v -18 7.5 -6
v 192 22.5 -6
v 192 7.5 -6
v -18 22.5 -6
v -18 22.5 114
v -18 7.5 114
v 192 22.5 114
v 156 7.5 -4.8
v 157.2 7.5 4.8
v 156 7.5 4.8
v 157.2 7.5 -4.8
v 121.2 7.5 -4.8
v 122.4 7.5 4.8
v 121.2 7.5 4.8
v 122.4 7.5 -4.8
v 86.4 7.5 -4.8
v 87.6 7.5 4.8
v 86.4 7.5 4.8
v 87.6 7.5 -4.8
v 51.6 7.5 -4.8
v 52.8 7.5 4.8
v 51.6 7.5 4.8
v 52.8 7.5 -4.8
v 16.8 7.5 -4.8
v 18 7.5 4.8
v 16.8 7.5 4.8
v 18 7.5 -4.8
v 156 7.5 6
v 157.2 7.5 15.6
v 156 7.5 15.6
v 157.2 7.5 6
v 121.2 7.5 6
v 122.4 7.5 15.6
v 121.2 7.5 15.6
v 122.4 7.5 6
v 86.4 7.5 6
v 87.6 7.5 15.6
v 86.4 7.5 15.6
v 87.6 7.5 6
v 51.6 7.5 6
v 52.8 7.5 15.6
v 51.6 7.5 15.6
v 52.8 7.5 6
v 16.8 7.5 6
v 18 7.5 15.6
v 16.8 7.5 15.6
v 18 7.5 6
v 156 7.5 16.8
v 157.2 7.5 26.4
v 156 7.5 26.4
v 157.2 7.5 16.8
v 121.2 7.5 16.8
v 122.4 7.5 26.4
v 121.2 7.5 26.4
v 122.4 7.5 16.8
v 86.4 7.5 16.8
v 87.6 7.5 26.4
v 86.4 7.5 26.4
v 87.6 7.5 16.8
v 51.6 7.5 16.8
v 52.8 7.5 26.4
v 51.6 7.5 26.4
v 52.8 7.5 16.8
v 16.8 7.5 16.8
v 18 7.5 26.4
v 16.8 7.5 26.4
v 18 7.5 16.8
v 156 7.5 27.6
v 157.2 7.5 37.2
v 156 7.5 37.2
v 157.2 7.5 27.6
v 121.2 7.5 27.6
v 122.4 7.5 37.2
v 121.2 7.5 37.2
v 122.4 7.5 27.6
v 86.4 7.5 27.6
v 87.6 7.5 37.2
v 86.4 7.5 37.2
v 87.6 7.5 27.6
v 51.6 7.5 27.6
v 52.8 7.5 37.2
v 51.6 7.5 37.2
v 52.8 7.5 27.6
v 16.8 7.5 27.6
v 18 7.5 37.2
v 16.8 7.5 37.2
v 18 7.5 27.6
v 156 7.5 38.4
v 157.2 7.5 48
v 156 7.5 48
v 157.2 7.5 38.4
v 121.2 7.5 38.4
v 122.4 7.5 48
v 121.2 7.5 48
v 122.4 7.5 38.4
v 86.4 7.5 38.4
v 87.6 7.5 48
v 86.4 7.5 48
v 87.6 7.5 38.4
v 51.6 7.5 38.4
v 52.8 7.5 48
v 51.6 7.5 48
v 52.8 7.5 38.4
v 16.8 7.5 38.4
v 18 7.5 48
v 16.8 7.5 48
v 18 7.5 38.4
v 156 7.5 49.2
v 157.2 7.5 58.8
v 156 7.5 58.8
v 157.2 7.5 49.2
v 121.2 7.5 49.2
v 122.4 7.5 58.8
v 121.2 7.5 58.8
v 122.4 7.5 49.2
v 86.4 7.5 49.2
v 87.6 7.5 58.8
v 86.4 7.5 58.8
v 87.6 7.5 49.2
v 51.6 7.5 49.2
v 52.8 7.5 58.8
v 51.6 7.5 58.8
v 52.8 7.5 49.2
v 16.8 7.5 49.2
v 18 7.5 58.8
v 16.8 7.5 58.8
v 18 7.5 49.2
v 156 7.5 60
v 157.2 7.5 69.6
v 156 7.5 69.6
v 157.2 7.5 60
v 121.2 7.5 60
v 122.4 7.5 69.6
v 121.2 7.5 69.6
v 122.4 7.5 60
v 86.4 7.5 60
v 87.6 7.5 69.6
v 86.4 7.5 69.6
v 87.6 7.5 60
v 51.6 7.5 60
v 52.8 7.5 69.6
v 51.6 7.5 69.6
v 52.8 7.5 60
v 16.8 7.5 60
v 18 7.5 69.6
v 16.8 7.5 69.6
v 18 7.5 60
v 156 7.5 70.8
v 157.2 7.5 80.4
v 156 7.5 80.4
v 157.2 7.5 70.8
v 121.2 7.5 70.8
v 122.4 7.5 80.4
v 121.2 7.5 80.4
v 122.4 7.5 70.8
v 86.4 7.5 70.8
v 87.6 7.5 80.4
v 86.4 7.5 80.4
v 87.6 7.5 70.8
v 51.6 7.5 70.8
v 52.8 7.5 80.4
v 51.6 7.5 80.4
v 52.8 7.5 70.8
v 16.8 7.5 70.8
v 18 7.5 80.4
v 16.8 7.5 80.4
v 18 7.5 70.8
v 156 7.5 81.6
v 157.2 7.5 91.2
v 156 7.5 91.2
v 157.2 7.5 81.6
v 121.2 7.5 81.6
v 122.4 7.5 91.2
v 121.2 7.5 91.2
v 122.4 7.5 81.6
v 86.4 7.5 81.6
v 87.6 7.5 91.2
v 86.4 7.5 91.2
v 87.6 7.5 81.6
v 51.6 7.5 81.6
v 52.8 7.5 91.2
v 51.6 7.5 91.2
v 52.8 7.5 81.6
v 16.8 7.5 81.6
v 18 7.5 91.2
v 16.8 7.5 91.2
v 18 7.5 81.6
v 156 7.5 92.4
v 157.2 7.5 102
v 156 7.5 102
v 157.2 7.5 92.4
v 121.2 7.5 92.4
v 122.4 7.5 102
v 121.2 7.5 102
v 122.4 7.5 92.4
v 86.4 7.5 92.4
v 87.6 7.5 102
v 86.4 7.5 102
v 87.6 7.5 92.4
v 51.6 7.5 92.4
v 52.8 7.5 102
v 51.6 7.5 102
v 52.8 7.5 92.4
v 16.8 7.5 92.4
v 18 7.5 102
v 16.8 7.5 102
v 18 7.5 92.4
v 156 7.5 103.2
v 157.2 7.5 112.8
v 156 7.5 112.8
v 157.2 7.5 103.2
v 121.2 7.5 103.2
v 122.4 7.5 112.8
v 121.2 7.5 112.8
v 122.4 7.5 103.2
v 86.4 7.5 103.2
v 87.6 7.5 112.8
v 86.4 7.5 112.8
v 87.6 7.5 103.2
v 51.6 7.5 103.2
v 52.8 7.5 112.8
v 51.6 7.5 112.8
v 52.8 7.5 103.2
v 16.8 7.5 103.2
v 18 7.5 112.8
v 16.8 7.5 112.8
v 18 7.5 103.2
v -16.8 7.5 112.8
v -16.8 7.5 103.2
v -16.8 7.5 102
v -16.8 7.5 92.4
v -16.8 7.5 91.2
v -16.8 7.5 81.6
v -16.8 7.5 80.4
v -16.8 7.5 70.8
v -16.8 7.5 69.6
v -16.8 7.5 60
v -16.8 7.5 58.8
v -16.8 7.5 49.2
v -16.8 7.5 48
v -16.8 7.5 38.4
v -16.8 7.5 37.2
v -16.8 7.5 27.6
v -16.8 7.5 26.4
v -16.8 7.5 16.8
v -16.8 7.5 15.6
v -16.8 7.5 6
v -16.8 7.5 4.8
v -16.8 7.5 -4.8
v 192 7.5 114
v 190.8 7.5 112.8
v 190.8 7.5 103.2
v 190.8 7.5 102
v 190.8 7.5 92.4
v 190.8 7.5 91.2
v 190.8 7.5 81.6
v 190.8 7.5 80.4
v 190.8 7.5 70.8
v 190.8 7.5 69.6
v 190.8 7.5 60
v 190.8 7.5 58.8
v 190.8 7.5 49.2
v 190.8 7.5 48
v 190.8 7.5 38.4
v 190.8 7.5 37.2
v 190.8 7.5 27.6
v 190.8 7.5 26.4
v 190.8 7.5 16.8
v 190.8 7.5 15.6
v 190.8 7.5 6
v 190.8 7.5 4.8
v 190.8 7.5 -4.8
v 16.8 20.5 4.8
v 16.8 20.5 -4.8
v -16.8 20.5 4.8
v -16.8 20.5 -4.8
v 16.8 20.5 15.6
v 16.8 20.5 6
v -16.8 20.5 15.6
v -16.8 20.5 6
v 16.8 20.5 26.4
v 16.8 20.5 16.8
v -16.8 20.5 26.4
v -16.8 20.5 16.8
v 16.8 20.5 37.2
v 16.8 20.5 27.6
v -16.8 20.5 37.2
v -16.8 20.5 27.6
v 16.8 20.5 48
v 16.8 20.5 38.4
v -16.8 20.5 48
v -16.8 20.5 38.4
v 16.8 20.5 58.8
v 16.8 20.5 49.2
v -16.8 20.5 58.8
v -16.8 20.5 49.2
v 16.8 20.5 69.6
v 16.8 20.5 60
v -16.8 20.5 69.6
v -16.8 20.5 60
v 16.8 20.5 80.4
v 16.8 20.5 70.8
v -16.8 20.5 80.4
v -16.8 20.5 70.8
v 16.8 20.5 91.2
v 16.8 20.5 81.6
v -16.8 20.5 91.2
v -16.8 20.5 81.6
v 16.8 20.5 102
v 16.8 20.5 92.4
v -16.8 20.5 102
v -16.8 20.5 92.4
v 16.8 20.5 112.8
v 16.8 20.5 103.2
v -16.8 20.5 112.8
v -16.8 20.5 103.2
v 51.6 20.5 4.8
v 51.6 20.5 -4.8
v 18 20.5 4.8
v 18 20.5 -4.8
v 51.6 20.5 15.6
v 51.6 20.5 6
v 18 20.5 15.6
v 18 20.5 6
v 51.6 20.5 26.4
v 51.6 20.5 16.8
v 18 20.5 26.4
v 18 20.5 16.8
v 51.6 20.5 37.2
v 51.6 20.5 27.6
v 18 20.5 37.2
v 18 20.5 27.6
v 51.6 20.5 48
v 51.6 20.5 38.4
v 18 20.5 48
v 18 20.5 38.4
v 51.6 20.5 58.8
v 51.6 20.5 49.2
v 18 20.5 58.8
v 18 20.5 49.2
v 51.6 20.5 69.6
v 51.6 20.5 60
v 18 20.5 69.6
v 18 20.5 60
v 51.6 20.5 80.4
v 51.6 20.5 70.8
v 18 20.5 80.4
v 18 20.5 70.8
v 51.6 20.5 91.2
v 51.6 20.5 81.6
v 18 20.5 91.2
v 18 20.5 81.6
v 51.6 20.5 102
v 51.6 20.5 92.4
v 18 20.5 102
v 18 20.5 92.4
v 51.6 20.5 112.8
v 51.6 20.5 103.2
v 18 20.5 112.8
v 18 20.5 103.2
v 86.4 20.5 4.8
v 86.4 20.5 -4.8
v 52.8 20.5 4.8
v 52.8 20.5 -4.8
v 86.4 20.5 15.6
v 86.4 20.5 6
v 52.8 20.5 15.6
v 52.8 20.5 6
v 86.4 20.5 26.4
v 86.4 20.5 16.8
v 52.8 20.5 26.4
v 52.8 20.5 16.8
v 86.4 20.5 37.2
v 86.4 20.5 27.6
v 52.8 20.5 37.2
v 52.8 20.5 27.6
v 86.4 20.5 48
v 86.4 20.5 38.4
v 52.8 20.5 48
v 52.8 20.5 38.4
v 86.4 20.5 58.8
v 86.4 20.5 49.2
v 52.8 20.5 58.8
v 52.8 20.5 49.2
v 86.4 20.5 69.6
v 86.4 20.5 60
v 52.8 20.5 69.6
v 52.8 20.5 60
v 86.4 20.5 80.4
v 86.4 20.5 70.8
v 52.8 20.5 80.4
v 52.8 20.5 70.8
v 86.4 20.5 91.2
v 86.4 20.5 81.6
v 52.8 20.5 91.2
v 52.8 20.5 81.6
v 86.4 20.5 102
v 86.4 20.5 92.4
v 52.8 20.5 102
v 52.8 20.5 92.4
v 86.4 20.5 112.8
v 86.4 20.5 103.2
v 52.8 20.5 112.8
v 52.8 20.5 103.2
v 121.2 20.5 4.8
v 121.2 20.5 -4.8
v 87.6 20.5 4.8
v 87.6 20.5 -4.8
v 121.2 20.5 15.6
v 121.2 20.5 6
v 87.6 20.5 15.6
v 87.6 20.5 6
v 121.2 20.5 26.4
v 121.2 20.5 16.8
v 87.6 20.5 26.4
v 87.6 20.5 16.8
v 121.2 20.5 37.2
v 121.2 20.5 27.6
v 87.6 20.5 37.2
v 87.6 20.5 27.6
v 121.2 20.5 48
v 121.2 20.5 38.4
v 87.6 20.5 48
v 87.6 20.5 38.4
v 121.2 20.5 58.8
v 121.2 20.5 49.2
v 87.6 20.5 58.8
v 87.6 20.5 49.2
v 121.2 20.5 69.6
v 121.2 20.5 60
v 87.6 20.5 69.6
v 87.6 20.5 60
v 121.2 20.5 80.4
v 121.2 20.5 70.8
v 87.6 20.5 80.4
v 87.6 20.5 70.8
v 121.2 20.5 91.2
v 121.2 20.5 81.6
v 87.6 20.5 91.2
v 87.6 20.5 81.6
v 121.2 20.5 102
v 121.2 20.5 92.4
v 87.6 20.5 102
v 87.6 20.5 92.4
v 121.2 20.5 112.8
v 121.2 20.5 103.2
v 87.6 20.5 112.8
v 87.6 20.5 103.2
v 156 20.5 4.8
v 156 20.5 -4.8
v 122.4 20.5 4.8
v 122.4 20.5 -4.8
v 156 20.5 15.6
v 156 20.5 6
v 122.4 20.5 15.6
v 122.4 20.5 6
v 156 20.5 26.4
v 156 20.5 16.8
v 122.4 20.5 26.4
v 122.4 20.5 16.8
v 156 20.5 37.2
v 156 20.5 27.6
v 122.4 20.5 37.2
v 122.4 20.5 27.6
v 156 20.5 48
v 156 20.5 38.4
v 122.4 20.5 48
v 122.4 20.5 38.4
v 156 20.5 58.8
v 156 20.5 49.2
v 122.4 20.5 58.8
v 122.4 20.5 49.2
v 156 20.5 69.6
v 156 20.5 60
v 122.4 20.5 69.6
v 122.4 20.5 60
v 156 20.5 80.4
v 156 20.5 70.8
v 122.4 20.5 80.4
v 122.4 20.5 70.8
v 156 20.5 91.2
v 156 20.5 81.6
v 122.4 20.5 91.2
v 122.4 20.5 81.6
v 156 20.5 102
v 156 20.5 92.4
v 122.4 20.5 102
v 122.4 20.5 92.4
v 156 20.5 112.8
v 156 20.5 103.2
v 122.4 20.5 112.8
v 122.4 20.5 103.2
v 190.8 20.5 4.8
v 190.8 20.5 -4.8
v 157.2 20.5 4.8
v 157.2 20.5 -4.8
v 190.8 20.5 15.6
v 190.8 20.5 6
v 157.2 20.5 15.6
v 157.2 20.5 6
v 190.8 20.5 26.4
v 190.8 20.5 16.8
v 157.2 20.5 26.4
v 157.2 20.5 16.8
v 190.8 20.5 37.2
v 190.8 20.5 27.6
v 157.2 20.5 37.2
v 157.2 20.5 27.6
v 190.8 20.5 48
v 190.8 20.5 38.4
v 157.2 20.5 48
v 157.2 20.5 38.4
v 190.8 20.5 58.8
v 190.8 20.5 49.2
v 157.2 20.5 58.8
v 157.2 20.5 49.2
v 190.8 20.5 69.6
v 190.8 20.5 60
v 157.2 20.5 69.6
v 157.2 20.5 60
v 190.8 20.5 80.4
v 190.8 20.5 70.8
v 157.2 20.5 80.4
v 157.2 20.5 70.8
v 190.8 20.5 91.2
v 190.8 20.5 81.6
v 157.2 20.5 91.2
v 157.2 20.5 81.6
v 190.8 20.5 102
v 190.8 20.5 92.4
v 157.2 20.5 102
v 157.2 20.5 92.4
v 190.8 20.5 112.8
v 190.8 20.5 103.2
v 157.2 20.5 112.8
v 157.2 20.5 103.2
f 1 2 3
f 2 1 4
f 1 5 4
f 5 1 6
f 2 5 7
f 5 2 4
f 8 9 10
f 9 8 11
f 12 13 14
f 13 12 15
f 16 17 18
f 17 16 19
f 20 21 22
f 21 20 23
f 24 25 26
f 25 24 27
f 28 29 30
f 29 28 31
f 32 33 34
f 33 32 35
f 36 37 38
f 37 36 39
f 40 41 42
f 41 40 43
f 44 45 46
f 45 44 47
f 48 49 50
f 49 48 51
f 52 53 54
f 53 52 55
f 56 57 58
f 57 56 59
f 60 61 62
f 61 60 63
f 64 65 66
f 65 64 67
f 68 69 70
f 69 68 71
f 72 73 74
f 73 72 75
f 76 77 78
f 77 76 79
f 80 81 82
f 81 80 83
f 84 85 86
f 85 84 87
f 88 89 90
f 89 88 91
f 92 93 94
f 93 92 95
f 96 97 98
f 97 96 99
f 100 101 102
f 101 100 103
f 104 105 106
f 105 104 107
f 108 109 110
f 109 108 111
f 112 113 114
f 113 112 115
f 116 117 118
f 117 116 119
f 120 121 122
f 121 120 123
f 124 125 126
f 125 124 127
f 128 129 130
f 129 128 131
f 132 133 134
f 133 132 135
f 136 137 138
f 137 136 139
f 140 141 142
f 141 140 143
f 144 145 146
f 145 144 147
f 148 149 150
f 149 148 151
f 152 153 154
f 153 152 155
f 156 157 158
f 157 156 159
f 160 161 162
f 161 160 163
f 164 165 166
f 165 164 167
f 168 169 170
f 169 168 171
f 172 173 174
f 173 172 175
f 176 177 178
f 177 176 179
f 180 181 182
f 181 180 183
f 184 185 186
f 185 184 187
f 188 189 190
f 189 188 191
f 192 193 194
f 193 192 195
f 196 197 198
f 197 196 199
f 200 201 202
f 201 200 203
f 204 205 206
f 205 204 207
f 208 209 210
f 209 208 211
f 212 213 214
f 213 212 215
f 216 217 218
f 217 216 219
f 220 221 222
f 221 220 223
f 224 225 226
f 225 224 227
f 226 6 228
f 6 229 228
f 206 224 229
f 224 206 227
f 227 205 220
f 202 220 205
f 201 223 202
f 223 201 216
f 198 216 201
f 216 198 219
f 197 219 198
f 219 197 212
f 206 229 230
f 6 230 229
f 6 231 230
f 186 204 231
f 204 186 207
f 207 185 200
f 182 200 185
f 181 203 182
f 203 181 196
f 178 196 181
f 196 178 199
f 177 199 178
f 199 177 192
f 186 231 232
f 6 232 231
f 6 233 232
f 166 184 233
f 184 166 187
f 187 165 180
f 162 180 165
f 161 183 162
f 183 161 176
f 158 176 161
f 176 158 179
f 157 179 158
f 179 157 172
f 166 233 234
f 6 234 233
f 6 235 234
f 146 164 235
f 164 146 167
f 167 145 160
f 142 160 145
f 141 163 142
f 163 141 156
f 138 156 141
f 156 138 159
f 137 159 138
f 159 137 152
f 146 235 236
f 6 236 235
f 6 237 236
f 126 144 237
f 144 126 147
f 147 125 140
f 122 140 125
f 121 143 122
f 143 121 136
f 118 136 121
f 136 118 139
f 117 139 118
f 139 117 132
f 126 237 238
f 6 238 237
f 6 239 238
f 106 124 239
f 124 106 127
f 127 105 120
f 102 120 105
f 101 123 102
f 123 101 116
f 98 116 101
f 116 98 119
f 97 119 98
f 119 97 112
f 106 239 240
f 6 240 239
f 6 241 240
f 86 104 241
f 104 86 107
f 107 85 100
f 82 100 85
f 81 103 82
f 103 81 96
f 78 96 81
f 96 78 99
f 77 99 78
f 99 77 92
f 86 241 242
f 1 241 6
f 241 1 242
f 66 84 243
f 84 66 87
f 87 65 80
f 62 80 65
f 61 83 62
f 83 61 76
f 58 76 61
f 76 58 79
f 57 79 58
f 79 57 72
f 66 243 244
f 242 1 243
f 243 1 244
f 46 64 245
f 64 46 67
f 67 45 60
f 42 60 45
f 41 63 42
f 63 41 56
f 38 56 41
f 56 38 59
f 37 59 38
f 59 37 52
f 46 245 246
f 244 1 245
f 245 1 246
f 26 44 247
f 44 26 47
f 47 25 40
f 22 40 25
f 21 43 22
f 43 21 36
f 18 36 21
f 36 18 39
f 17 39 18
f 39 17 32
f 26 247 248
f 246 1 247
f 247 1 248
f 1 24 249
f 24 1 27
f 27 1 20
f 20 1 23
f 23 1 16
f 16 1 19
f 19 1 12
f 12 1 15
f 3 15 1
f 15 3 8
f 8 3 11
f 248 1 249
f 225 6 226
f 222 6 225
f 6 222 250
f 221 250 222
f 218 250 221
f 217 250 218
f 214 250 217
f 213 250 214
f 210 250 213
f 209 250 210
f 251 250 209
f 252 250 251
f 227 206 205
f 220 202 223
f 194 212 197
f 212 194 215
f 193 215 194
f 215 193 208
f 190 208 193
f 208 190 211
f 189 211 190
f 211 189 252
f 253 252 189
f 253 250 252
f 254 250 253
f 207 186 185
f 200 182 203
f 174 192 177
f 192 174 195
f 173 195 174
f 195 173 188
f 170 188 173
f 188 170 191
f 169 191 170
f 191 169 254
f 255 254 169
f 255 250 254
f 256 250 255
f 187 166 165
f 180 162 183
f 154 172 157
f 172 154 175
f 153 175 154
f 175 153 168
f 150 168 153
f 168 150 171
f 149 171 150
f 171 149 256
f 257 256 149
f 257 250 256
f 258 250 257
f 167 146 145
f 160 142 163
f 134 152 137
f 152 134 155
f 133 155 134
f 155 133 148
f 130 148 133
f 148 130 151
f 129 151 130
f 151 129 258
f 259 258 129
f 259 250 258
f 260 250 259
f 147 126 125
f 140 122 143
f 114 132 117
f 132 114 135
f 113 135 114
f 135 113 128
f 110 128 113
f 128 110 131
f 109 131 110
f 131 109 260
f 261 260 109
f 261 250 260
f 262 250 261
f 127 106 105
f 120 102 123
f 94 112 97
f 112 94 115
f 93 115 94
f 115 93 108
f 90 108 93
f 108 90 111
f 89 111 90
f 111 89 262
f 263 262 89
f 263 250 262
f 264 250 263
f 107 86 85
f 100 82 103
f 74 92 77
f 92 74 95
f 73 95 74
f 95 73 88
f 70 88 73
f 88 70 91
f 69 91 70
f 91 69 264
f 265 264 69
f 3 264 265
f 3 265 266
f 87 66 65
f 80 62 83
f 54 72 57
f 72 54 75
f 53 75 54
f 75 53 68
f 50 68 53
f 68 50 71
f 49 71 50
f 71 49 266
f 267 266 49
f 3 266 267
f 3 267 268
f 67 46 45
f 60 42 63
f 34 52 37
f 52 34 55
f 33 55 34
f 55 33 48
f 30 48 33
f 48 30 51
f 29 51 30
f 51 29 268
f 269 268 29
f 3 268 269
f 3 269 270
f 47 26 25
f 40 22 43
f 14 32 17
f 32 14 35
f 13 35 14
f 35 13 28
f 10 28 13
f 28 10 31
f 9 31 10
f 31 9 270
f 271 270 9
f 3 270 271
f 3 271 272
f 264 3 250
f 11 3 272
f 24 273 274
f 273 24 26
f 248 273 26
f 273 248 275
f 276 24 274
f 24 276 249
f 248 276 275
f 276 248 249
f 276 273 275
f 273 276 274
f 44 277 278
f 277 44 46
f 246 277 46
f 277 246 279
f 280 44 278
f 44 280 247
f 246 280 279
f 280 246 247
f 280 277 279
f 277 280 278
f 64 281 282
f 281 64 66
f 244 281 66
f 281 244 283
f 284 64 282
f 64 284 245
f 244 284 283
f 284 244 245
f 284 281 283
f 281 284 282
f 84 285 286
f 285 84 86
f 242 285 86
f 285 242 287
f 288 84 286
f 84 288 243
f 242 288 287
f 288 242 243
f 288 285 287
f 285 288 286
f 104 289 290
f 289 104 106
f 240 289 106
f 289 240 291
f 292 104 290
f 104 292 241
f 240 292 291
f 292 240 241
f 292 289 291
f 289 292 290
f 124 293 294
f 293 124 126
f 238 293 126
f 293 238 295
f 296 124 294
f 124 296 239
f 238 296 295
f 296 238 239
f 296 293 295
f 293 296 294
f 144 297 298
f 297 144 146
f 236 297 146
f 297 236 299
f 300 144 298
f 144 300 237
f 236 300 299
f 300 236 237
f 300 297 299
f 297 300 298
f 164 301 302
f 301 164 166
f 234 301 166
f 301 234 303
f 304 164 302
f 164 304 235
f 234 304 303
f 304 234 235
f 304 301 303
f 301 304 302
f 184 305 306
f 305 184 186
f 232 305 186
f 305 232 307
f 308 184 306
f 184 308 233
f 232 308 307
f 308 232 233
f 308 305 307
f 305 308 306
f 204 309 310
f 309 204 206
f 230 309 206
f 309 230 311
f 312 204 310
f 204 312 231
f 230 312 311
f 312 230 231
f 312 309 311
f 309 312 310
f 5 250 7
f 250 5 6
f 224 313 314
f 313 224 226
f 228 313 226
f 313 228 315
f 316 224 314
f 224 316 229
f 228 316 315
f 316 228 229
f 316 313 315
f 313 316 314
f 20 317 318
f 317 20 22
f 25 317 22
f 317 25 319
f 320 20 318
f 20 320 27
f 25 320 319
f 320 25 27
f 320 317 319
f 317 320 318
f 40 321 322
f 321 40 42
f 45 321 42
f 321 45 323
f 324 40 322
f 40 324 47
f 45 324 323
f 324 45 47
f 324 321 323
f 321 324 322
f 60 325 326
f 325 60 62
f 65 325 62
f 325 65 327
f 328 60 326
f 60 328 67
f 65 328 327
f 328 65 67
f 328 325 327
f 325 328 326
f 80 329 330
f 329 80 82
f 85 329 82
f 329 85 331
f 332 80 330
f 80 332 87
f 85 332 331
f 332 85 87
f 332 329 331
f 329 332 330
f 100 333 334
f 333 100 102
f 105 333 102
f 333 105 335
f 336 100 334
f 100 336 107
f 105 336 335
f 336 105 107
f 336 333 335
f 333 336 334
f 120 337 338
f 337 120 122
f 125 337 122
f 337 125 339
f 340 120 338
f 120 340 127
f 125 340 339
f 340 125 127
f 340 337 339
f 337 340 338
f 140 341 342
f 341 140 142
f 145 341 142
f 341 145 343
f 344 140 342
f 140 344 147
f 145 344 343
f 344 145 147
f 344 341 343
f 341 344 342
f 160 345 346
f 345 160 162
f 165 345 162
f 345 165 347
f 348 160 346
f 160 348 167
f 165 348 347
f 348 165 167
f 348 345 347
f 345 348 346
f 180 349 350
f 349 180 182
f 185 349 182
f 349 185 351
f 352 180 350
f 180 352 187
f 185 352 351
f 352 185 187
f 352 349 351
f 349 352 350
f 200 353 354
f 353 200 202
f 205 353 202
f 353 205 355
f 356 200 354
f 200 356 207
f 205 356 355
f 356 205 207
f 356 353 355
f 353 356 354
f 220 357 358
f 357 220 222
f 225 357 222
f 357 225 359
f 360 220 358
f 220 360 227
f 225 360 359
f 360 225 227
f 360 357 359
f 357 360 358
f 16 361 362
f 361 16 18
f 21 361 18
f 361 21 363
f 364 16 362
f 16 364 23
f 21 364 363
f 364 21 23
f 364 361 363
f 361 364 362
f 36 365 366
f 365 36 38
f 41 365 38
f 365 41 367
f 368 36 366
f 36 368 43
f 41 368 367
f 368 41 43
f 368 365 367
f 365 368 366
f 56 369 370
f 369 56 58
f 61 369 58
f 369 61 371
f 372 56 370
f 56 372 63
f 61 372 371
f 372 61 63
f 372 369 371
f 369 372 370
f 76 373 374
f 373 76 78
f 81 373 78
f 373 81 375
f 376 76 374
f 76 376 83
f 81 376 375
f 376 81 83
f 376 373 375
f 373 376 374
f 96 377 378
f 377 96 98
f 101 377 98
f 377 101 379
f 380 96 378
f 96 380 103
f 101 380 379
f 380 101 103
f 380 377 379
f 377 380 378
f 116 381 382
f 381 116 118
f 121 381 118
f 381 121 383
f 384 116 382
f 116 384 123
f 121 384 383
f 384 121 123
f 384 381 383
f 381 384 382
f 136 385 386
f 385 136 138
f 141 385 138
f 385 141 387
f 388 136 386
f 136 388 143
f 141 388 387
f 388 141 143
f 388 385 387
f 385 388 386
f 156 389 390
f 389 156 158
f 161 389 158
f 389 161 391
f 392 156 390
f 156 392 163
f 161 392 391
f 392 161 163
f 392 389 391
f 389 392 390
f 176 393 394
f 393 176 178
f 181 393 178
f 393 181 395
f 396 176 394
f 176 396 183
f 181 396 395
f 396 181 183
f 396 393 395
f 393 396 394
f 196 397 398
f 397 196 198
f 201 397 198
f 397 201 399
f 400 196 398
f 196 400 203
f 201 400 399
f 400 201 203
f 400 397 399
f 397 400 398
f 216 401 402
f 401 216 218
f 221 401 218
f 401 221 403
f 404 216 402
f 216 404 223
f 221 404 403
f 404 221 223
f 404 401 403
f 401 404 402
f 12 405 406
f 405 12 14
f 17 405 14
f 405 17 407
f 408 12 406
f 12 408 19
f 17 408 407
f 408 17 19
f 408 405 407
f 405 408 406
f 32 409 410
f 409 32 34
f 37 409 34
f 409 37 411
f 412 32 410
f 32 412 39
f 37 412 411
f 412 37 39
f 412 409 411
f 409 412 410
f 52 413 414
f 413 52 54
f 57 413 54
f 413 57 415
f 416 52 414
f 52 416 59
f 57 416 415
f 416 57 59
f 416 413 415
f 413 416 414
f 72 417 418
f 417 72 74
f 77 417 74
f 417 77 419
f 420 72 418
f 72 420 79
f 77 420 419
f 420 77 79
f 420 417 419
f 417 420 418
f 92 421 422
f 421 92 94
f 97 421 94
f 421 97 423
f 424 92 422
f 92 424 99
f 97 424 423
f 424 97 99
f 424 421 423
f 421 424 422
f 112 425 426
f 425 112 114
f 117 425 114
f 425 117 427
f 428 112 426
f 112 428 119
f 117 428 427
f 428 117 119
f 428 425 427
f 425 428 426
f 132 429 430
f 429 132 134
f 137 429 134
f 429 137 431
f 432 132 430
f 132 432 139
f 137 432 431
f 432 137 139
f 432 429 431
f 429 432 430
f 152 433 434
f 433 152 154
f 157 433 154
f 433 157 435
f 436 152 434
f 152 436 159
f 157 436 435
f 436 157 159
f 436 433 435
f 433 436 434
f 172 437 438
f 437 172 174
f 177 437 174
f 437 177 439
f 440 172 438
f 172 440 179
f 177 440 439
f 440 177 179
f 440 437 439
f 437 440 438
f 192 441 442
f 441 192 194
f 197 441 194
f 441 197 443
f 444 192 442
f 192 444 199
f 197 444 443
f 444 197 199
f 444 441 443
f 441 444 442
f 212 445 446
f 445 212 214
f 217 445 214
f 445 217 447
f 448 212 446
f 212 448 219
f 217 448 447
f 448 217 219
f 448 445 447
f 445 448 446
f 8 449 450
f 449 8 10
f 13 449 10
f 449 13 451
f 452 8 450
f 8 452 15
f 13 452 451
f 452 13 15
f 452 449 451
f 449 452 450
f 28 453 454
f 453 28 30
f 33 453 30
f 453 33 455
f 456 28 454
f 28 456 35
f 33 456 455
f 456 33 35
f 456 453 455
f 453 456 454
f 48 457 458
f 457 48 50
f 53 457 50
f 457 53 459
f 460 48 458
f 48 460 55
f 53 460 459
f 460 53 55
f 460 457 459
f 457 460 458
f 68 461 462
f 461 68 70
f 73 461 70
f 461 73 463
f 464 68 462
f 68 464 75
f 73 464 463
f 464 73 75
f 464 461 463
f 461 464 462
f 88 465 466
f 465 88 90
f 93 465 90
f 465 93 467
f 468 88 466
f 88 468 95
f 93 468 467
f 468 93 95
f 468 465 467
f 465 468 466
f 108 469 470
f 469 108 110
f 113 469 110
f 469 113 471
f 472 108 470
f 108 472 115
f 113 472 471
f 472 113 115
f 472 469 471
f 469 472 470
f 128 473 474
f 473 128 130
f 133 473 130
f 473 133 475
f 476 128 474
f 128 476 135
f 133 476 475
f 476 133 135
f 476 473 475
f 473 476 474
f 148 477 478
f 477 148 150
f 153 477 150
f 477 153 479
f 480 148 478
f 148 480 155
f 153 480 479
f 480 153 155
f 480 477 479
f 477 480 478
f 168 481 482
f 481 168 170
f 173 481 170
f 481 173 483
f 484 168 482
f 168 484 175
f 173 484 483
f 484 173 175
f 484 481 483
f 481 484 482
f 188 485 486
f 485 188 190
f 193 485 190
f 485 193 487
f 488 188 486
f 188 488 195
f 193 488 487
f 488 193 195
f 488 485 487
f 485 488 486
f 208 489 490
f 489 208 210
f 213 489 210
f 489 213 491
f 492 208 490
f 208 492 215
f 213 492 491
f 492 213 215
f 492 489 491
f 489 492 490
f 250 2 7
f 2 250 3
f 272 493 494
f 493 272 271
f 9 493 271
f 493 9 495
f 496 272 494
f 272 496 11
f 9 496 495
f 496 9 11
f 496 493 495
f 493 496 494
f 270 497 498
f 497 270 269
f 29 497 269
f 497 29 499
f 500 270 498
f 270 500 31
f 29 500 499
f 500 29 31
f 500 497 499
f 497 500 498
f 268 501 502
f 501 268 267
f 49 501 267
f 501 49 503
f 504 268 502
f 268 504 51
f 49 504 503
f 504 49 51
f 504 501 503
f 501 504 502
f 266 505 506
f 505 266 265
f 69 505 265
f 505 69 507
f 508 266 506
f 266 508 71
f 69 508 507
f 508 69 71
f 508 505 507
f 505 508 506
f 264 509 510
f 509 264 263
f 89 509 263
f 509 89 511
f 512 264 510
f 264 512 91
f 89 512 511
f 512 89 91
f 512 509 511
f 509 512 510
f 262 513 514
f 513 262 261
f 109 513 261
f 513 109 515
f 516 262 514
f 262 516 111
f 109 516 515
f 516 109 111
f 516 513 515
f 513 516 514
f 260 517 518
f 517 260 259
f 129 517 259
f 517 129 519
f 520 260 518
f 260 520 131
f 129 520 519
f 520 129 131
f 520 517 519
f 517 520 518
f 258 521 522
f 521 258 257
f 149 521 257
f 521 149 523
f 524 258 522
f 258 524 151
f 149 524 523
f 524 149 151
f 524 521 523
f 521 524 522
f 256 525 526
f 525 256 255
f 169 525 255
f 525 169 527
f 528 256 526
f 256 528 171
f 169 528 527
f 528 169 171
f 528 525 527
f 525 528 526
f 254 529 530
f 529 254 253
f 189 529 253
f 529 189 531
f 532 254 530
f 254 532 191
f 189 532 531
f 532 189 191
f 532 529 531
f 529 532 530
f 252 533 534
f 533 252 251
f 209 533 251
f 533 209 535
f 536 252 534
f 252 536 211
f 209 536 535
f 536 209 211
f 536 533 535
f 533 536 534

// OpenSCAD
// Flaps holding box

$fn = 50;

w=36;
d=12;
wall=1.2;


for ( y = [0 : 5] ){
  for ( x = [0 : 10] ){
   translate([y*(w-wall),0,x*(d-wall)])
   box();
   }
 }

module box(){
difference(){
translate([0,15,0])
cube([w,15,d], center=true);

translate([0,13,0])
cube([w-(wall*2),15,d-(wall*2)], center=true);

}
}



//linear_extrude(h=(3*0.16))
//import("flap.dxf");
